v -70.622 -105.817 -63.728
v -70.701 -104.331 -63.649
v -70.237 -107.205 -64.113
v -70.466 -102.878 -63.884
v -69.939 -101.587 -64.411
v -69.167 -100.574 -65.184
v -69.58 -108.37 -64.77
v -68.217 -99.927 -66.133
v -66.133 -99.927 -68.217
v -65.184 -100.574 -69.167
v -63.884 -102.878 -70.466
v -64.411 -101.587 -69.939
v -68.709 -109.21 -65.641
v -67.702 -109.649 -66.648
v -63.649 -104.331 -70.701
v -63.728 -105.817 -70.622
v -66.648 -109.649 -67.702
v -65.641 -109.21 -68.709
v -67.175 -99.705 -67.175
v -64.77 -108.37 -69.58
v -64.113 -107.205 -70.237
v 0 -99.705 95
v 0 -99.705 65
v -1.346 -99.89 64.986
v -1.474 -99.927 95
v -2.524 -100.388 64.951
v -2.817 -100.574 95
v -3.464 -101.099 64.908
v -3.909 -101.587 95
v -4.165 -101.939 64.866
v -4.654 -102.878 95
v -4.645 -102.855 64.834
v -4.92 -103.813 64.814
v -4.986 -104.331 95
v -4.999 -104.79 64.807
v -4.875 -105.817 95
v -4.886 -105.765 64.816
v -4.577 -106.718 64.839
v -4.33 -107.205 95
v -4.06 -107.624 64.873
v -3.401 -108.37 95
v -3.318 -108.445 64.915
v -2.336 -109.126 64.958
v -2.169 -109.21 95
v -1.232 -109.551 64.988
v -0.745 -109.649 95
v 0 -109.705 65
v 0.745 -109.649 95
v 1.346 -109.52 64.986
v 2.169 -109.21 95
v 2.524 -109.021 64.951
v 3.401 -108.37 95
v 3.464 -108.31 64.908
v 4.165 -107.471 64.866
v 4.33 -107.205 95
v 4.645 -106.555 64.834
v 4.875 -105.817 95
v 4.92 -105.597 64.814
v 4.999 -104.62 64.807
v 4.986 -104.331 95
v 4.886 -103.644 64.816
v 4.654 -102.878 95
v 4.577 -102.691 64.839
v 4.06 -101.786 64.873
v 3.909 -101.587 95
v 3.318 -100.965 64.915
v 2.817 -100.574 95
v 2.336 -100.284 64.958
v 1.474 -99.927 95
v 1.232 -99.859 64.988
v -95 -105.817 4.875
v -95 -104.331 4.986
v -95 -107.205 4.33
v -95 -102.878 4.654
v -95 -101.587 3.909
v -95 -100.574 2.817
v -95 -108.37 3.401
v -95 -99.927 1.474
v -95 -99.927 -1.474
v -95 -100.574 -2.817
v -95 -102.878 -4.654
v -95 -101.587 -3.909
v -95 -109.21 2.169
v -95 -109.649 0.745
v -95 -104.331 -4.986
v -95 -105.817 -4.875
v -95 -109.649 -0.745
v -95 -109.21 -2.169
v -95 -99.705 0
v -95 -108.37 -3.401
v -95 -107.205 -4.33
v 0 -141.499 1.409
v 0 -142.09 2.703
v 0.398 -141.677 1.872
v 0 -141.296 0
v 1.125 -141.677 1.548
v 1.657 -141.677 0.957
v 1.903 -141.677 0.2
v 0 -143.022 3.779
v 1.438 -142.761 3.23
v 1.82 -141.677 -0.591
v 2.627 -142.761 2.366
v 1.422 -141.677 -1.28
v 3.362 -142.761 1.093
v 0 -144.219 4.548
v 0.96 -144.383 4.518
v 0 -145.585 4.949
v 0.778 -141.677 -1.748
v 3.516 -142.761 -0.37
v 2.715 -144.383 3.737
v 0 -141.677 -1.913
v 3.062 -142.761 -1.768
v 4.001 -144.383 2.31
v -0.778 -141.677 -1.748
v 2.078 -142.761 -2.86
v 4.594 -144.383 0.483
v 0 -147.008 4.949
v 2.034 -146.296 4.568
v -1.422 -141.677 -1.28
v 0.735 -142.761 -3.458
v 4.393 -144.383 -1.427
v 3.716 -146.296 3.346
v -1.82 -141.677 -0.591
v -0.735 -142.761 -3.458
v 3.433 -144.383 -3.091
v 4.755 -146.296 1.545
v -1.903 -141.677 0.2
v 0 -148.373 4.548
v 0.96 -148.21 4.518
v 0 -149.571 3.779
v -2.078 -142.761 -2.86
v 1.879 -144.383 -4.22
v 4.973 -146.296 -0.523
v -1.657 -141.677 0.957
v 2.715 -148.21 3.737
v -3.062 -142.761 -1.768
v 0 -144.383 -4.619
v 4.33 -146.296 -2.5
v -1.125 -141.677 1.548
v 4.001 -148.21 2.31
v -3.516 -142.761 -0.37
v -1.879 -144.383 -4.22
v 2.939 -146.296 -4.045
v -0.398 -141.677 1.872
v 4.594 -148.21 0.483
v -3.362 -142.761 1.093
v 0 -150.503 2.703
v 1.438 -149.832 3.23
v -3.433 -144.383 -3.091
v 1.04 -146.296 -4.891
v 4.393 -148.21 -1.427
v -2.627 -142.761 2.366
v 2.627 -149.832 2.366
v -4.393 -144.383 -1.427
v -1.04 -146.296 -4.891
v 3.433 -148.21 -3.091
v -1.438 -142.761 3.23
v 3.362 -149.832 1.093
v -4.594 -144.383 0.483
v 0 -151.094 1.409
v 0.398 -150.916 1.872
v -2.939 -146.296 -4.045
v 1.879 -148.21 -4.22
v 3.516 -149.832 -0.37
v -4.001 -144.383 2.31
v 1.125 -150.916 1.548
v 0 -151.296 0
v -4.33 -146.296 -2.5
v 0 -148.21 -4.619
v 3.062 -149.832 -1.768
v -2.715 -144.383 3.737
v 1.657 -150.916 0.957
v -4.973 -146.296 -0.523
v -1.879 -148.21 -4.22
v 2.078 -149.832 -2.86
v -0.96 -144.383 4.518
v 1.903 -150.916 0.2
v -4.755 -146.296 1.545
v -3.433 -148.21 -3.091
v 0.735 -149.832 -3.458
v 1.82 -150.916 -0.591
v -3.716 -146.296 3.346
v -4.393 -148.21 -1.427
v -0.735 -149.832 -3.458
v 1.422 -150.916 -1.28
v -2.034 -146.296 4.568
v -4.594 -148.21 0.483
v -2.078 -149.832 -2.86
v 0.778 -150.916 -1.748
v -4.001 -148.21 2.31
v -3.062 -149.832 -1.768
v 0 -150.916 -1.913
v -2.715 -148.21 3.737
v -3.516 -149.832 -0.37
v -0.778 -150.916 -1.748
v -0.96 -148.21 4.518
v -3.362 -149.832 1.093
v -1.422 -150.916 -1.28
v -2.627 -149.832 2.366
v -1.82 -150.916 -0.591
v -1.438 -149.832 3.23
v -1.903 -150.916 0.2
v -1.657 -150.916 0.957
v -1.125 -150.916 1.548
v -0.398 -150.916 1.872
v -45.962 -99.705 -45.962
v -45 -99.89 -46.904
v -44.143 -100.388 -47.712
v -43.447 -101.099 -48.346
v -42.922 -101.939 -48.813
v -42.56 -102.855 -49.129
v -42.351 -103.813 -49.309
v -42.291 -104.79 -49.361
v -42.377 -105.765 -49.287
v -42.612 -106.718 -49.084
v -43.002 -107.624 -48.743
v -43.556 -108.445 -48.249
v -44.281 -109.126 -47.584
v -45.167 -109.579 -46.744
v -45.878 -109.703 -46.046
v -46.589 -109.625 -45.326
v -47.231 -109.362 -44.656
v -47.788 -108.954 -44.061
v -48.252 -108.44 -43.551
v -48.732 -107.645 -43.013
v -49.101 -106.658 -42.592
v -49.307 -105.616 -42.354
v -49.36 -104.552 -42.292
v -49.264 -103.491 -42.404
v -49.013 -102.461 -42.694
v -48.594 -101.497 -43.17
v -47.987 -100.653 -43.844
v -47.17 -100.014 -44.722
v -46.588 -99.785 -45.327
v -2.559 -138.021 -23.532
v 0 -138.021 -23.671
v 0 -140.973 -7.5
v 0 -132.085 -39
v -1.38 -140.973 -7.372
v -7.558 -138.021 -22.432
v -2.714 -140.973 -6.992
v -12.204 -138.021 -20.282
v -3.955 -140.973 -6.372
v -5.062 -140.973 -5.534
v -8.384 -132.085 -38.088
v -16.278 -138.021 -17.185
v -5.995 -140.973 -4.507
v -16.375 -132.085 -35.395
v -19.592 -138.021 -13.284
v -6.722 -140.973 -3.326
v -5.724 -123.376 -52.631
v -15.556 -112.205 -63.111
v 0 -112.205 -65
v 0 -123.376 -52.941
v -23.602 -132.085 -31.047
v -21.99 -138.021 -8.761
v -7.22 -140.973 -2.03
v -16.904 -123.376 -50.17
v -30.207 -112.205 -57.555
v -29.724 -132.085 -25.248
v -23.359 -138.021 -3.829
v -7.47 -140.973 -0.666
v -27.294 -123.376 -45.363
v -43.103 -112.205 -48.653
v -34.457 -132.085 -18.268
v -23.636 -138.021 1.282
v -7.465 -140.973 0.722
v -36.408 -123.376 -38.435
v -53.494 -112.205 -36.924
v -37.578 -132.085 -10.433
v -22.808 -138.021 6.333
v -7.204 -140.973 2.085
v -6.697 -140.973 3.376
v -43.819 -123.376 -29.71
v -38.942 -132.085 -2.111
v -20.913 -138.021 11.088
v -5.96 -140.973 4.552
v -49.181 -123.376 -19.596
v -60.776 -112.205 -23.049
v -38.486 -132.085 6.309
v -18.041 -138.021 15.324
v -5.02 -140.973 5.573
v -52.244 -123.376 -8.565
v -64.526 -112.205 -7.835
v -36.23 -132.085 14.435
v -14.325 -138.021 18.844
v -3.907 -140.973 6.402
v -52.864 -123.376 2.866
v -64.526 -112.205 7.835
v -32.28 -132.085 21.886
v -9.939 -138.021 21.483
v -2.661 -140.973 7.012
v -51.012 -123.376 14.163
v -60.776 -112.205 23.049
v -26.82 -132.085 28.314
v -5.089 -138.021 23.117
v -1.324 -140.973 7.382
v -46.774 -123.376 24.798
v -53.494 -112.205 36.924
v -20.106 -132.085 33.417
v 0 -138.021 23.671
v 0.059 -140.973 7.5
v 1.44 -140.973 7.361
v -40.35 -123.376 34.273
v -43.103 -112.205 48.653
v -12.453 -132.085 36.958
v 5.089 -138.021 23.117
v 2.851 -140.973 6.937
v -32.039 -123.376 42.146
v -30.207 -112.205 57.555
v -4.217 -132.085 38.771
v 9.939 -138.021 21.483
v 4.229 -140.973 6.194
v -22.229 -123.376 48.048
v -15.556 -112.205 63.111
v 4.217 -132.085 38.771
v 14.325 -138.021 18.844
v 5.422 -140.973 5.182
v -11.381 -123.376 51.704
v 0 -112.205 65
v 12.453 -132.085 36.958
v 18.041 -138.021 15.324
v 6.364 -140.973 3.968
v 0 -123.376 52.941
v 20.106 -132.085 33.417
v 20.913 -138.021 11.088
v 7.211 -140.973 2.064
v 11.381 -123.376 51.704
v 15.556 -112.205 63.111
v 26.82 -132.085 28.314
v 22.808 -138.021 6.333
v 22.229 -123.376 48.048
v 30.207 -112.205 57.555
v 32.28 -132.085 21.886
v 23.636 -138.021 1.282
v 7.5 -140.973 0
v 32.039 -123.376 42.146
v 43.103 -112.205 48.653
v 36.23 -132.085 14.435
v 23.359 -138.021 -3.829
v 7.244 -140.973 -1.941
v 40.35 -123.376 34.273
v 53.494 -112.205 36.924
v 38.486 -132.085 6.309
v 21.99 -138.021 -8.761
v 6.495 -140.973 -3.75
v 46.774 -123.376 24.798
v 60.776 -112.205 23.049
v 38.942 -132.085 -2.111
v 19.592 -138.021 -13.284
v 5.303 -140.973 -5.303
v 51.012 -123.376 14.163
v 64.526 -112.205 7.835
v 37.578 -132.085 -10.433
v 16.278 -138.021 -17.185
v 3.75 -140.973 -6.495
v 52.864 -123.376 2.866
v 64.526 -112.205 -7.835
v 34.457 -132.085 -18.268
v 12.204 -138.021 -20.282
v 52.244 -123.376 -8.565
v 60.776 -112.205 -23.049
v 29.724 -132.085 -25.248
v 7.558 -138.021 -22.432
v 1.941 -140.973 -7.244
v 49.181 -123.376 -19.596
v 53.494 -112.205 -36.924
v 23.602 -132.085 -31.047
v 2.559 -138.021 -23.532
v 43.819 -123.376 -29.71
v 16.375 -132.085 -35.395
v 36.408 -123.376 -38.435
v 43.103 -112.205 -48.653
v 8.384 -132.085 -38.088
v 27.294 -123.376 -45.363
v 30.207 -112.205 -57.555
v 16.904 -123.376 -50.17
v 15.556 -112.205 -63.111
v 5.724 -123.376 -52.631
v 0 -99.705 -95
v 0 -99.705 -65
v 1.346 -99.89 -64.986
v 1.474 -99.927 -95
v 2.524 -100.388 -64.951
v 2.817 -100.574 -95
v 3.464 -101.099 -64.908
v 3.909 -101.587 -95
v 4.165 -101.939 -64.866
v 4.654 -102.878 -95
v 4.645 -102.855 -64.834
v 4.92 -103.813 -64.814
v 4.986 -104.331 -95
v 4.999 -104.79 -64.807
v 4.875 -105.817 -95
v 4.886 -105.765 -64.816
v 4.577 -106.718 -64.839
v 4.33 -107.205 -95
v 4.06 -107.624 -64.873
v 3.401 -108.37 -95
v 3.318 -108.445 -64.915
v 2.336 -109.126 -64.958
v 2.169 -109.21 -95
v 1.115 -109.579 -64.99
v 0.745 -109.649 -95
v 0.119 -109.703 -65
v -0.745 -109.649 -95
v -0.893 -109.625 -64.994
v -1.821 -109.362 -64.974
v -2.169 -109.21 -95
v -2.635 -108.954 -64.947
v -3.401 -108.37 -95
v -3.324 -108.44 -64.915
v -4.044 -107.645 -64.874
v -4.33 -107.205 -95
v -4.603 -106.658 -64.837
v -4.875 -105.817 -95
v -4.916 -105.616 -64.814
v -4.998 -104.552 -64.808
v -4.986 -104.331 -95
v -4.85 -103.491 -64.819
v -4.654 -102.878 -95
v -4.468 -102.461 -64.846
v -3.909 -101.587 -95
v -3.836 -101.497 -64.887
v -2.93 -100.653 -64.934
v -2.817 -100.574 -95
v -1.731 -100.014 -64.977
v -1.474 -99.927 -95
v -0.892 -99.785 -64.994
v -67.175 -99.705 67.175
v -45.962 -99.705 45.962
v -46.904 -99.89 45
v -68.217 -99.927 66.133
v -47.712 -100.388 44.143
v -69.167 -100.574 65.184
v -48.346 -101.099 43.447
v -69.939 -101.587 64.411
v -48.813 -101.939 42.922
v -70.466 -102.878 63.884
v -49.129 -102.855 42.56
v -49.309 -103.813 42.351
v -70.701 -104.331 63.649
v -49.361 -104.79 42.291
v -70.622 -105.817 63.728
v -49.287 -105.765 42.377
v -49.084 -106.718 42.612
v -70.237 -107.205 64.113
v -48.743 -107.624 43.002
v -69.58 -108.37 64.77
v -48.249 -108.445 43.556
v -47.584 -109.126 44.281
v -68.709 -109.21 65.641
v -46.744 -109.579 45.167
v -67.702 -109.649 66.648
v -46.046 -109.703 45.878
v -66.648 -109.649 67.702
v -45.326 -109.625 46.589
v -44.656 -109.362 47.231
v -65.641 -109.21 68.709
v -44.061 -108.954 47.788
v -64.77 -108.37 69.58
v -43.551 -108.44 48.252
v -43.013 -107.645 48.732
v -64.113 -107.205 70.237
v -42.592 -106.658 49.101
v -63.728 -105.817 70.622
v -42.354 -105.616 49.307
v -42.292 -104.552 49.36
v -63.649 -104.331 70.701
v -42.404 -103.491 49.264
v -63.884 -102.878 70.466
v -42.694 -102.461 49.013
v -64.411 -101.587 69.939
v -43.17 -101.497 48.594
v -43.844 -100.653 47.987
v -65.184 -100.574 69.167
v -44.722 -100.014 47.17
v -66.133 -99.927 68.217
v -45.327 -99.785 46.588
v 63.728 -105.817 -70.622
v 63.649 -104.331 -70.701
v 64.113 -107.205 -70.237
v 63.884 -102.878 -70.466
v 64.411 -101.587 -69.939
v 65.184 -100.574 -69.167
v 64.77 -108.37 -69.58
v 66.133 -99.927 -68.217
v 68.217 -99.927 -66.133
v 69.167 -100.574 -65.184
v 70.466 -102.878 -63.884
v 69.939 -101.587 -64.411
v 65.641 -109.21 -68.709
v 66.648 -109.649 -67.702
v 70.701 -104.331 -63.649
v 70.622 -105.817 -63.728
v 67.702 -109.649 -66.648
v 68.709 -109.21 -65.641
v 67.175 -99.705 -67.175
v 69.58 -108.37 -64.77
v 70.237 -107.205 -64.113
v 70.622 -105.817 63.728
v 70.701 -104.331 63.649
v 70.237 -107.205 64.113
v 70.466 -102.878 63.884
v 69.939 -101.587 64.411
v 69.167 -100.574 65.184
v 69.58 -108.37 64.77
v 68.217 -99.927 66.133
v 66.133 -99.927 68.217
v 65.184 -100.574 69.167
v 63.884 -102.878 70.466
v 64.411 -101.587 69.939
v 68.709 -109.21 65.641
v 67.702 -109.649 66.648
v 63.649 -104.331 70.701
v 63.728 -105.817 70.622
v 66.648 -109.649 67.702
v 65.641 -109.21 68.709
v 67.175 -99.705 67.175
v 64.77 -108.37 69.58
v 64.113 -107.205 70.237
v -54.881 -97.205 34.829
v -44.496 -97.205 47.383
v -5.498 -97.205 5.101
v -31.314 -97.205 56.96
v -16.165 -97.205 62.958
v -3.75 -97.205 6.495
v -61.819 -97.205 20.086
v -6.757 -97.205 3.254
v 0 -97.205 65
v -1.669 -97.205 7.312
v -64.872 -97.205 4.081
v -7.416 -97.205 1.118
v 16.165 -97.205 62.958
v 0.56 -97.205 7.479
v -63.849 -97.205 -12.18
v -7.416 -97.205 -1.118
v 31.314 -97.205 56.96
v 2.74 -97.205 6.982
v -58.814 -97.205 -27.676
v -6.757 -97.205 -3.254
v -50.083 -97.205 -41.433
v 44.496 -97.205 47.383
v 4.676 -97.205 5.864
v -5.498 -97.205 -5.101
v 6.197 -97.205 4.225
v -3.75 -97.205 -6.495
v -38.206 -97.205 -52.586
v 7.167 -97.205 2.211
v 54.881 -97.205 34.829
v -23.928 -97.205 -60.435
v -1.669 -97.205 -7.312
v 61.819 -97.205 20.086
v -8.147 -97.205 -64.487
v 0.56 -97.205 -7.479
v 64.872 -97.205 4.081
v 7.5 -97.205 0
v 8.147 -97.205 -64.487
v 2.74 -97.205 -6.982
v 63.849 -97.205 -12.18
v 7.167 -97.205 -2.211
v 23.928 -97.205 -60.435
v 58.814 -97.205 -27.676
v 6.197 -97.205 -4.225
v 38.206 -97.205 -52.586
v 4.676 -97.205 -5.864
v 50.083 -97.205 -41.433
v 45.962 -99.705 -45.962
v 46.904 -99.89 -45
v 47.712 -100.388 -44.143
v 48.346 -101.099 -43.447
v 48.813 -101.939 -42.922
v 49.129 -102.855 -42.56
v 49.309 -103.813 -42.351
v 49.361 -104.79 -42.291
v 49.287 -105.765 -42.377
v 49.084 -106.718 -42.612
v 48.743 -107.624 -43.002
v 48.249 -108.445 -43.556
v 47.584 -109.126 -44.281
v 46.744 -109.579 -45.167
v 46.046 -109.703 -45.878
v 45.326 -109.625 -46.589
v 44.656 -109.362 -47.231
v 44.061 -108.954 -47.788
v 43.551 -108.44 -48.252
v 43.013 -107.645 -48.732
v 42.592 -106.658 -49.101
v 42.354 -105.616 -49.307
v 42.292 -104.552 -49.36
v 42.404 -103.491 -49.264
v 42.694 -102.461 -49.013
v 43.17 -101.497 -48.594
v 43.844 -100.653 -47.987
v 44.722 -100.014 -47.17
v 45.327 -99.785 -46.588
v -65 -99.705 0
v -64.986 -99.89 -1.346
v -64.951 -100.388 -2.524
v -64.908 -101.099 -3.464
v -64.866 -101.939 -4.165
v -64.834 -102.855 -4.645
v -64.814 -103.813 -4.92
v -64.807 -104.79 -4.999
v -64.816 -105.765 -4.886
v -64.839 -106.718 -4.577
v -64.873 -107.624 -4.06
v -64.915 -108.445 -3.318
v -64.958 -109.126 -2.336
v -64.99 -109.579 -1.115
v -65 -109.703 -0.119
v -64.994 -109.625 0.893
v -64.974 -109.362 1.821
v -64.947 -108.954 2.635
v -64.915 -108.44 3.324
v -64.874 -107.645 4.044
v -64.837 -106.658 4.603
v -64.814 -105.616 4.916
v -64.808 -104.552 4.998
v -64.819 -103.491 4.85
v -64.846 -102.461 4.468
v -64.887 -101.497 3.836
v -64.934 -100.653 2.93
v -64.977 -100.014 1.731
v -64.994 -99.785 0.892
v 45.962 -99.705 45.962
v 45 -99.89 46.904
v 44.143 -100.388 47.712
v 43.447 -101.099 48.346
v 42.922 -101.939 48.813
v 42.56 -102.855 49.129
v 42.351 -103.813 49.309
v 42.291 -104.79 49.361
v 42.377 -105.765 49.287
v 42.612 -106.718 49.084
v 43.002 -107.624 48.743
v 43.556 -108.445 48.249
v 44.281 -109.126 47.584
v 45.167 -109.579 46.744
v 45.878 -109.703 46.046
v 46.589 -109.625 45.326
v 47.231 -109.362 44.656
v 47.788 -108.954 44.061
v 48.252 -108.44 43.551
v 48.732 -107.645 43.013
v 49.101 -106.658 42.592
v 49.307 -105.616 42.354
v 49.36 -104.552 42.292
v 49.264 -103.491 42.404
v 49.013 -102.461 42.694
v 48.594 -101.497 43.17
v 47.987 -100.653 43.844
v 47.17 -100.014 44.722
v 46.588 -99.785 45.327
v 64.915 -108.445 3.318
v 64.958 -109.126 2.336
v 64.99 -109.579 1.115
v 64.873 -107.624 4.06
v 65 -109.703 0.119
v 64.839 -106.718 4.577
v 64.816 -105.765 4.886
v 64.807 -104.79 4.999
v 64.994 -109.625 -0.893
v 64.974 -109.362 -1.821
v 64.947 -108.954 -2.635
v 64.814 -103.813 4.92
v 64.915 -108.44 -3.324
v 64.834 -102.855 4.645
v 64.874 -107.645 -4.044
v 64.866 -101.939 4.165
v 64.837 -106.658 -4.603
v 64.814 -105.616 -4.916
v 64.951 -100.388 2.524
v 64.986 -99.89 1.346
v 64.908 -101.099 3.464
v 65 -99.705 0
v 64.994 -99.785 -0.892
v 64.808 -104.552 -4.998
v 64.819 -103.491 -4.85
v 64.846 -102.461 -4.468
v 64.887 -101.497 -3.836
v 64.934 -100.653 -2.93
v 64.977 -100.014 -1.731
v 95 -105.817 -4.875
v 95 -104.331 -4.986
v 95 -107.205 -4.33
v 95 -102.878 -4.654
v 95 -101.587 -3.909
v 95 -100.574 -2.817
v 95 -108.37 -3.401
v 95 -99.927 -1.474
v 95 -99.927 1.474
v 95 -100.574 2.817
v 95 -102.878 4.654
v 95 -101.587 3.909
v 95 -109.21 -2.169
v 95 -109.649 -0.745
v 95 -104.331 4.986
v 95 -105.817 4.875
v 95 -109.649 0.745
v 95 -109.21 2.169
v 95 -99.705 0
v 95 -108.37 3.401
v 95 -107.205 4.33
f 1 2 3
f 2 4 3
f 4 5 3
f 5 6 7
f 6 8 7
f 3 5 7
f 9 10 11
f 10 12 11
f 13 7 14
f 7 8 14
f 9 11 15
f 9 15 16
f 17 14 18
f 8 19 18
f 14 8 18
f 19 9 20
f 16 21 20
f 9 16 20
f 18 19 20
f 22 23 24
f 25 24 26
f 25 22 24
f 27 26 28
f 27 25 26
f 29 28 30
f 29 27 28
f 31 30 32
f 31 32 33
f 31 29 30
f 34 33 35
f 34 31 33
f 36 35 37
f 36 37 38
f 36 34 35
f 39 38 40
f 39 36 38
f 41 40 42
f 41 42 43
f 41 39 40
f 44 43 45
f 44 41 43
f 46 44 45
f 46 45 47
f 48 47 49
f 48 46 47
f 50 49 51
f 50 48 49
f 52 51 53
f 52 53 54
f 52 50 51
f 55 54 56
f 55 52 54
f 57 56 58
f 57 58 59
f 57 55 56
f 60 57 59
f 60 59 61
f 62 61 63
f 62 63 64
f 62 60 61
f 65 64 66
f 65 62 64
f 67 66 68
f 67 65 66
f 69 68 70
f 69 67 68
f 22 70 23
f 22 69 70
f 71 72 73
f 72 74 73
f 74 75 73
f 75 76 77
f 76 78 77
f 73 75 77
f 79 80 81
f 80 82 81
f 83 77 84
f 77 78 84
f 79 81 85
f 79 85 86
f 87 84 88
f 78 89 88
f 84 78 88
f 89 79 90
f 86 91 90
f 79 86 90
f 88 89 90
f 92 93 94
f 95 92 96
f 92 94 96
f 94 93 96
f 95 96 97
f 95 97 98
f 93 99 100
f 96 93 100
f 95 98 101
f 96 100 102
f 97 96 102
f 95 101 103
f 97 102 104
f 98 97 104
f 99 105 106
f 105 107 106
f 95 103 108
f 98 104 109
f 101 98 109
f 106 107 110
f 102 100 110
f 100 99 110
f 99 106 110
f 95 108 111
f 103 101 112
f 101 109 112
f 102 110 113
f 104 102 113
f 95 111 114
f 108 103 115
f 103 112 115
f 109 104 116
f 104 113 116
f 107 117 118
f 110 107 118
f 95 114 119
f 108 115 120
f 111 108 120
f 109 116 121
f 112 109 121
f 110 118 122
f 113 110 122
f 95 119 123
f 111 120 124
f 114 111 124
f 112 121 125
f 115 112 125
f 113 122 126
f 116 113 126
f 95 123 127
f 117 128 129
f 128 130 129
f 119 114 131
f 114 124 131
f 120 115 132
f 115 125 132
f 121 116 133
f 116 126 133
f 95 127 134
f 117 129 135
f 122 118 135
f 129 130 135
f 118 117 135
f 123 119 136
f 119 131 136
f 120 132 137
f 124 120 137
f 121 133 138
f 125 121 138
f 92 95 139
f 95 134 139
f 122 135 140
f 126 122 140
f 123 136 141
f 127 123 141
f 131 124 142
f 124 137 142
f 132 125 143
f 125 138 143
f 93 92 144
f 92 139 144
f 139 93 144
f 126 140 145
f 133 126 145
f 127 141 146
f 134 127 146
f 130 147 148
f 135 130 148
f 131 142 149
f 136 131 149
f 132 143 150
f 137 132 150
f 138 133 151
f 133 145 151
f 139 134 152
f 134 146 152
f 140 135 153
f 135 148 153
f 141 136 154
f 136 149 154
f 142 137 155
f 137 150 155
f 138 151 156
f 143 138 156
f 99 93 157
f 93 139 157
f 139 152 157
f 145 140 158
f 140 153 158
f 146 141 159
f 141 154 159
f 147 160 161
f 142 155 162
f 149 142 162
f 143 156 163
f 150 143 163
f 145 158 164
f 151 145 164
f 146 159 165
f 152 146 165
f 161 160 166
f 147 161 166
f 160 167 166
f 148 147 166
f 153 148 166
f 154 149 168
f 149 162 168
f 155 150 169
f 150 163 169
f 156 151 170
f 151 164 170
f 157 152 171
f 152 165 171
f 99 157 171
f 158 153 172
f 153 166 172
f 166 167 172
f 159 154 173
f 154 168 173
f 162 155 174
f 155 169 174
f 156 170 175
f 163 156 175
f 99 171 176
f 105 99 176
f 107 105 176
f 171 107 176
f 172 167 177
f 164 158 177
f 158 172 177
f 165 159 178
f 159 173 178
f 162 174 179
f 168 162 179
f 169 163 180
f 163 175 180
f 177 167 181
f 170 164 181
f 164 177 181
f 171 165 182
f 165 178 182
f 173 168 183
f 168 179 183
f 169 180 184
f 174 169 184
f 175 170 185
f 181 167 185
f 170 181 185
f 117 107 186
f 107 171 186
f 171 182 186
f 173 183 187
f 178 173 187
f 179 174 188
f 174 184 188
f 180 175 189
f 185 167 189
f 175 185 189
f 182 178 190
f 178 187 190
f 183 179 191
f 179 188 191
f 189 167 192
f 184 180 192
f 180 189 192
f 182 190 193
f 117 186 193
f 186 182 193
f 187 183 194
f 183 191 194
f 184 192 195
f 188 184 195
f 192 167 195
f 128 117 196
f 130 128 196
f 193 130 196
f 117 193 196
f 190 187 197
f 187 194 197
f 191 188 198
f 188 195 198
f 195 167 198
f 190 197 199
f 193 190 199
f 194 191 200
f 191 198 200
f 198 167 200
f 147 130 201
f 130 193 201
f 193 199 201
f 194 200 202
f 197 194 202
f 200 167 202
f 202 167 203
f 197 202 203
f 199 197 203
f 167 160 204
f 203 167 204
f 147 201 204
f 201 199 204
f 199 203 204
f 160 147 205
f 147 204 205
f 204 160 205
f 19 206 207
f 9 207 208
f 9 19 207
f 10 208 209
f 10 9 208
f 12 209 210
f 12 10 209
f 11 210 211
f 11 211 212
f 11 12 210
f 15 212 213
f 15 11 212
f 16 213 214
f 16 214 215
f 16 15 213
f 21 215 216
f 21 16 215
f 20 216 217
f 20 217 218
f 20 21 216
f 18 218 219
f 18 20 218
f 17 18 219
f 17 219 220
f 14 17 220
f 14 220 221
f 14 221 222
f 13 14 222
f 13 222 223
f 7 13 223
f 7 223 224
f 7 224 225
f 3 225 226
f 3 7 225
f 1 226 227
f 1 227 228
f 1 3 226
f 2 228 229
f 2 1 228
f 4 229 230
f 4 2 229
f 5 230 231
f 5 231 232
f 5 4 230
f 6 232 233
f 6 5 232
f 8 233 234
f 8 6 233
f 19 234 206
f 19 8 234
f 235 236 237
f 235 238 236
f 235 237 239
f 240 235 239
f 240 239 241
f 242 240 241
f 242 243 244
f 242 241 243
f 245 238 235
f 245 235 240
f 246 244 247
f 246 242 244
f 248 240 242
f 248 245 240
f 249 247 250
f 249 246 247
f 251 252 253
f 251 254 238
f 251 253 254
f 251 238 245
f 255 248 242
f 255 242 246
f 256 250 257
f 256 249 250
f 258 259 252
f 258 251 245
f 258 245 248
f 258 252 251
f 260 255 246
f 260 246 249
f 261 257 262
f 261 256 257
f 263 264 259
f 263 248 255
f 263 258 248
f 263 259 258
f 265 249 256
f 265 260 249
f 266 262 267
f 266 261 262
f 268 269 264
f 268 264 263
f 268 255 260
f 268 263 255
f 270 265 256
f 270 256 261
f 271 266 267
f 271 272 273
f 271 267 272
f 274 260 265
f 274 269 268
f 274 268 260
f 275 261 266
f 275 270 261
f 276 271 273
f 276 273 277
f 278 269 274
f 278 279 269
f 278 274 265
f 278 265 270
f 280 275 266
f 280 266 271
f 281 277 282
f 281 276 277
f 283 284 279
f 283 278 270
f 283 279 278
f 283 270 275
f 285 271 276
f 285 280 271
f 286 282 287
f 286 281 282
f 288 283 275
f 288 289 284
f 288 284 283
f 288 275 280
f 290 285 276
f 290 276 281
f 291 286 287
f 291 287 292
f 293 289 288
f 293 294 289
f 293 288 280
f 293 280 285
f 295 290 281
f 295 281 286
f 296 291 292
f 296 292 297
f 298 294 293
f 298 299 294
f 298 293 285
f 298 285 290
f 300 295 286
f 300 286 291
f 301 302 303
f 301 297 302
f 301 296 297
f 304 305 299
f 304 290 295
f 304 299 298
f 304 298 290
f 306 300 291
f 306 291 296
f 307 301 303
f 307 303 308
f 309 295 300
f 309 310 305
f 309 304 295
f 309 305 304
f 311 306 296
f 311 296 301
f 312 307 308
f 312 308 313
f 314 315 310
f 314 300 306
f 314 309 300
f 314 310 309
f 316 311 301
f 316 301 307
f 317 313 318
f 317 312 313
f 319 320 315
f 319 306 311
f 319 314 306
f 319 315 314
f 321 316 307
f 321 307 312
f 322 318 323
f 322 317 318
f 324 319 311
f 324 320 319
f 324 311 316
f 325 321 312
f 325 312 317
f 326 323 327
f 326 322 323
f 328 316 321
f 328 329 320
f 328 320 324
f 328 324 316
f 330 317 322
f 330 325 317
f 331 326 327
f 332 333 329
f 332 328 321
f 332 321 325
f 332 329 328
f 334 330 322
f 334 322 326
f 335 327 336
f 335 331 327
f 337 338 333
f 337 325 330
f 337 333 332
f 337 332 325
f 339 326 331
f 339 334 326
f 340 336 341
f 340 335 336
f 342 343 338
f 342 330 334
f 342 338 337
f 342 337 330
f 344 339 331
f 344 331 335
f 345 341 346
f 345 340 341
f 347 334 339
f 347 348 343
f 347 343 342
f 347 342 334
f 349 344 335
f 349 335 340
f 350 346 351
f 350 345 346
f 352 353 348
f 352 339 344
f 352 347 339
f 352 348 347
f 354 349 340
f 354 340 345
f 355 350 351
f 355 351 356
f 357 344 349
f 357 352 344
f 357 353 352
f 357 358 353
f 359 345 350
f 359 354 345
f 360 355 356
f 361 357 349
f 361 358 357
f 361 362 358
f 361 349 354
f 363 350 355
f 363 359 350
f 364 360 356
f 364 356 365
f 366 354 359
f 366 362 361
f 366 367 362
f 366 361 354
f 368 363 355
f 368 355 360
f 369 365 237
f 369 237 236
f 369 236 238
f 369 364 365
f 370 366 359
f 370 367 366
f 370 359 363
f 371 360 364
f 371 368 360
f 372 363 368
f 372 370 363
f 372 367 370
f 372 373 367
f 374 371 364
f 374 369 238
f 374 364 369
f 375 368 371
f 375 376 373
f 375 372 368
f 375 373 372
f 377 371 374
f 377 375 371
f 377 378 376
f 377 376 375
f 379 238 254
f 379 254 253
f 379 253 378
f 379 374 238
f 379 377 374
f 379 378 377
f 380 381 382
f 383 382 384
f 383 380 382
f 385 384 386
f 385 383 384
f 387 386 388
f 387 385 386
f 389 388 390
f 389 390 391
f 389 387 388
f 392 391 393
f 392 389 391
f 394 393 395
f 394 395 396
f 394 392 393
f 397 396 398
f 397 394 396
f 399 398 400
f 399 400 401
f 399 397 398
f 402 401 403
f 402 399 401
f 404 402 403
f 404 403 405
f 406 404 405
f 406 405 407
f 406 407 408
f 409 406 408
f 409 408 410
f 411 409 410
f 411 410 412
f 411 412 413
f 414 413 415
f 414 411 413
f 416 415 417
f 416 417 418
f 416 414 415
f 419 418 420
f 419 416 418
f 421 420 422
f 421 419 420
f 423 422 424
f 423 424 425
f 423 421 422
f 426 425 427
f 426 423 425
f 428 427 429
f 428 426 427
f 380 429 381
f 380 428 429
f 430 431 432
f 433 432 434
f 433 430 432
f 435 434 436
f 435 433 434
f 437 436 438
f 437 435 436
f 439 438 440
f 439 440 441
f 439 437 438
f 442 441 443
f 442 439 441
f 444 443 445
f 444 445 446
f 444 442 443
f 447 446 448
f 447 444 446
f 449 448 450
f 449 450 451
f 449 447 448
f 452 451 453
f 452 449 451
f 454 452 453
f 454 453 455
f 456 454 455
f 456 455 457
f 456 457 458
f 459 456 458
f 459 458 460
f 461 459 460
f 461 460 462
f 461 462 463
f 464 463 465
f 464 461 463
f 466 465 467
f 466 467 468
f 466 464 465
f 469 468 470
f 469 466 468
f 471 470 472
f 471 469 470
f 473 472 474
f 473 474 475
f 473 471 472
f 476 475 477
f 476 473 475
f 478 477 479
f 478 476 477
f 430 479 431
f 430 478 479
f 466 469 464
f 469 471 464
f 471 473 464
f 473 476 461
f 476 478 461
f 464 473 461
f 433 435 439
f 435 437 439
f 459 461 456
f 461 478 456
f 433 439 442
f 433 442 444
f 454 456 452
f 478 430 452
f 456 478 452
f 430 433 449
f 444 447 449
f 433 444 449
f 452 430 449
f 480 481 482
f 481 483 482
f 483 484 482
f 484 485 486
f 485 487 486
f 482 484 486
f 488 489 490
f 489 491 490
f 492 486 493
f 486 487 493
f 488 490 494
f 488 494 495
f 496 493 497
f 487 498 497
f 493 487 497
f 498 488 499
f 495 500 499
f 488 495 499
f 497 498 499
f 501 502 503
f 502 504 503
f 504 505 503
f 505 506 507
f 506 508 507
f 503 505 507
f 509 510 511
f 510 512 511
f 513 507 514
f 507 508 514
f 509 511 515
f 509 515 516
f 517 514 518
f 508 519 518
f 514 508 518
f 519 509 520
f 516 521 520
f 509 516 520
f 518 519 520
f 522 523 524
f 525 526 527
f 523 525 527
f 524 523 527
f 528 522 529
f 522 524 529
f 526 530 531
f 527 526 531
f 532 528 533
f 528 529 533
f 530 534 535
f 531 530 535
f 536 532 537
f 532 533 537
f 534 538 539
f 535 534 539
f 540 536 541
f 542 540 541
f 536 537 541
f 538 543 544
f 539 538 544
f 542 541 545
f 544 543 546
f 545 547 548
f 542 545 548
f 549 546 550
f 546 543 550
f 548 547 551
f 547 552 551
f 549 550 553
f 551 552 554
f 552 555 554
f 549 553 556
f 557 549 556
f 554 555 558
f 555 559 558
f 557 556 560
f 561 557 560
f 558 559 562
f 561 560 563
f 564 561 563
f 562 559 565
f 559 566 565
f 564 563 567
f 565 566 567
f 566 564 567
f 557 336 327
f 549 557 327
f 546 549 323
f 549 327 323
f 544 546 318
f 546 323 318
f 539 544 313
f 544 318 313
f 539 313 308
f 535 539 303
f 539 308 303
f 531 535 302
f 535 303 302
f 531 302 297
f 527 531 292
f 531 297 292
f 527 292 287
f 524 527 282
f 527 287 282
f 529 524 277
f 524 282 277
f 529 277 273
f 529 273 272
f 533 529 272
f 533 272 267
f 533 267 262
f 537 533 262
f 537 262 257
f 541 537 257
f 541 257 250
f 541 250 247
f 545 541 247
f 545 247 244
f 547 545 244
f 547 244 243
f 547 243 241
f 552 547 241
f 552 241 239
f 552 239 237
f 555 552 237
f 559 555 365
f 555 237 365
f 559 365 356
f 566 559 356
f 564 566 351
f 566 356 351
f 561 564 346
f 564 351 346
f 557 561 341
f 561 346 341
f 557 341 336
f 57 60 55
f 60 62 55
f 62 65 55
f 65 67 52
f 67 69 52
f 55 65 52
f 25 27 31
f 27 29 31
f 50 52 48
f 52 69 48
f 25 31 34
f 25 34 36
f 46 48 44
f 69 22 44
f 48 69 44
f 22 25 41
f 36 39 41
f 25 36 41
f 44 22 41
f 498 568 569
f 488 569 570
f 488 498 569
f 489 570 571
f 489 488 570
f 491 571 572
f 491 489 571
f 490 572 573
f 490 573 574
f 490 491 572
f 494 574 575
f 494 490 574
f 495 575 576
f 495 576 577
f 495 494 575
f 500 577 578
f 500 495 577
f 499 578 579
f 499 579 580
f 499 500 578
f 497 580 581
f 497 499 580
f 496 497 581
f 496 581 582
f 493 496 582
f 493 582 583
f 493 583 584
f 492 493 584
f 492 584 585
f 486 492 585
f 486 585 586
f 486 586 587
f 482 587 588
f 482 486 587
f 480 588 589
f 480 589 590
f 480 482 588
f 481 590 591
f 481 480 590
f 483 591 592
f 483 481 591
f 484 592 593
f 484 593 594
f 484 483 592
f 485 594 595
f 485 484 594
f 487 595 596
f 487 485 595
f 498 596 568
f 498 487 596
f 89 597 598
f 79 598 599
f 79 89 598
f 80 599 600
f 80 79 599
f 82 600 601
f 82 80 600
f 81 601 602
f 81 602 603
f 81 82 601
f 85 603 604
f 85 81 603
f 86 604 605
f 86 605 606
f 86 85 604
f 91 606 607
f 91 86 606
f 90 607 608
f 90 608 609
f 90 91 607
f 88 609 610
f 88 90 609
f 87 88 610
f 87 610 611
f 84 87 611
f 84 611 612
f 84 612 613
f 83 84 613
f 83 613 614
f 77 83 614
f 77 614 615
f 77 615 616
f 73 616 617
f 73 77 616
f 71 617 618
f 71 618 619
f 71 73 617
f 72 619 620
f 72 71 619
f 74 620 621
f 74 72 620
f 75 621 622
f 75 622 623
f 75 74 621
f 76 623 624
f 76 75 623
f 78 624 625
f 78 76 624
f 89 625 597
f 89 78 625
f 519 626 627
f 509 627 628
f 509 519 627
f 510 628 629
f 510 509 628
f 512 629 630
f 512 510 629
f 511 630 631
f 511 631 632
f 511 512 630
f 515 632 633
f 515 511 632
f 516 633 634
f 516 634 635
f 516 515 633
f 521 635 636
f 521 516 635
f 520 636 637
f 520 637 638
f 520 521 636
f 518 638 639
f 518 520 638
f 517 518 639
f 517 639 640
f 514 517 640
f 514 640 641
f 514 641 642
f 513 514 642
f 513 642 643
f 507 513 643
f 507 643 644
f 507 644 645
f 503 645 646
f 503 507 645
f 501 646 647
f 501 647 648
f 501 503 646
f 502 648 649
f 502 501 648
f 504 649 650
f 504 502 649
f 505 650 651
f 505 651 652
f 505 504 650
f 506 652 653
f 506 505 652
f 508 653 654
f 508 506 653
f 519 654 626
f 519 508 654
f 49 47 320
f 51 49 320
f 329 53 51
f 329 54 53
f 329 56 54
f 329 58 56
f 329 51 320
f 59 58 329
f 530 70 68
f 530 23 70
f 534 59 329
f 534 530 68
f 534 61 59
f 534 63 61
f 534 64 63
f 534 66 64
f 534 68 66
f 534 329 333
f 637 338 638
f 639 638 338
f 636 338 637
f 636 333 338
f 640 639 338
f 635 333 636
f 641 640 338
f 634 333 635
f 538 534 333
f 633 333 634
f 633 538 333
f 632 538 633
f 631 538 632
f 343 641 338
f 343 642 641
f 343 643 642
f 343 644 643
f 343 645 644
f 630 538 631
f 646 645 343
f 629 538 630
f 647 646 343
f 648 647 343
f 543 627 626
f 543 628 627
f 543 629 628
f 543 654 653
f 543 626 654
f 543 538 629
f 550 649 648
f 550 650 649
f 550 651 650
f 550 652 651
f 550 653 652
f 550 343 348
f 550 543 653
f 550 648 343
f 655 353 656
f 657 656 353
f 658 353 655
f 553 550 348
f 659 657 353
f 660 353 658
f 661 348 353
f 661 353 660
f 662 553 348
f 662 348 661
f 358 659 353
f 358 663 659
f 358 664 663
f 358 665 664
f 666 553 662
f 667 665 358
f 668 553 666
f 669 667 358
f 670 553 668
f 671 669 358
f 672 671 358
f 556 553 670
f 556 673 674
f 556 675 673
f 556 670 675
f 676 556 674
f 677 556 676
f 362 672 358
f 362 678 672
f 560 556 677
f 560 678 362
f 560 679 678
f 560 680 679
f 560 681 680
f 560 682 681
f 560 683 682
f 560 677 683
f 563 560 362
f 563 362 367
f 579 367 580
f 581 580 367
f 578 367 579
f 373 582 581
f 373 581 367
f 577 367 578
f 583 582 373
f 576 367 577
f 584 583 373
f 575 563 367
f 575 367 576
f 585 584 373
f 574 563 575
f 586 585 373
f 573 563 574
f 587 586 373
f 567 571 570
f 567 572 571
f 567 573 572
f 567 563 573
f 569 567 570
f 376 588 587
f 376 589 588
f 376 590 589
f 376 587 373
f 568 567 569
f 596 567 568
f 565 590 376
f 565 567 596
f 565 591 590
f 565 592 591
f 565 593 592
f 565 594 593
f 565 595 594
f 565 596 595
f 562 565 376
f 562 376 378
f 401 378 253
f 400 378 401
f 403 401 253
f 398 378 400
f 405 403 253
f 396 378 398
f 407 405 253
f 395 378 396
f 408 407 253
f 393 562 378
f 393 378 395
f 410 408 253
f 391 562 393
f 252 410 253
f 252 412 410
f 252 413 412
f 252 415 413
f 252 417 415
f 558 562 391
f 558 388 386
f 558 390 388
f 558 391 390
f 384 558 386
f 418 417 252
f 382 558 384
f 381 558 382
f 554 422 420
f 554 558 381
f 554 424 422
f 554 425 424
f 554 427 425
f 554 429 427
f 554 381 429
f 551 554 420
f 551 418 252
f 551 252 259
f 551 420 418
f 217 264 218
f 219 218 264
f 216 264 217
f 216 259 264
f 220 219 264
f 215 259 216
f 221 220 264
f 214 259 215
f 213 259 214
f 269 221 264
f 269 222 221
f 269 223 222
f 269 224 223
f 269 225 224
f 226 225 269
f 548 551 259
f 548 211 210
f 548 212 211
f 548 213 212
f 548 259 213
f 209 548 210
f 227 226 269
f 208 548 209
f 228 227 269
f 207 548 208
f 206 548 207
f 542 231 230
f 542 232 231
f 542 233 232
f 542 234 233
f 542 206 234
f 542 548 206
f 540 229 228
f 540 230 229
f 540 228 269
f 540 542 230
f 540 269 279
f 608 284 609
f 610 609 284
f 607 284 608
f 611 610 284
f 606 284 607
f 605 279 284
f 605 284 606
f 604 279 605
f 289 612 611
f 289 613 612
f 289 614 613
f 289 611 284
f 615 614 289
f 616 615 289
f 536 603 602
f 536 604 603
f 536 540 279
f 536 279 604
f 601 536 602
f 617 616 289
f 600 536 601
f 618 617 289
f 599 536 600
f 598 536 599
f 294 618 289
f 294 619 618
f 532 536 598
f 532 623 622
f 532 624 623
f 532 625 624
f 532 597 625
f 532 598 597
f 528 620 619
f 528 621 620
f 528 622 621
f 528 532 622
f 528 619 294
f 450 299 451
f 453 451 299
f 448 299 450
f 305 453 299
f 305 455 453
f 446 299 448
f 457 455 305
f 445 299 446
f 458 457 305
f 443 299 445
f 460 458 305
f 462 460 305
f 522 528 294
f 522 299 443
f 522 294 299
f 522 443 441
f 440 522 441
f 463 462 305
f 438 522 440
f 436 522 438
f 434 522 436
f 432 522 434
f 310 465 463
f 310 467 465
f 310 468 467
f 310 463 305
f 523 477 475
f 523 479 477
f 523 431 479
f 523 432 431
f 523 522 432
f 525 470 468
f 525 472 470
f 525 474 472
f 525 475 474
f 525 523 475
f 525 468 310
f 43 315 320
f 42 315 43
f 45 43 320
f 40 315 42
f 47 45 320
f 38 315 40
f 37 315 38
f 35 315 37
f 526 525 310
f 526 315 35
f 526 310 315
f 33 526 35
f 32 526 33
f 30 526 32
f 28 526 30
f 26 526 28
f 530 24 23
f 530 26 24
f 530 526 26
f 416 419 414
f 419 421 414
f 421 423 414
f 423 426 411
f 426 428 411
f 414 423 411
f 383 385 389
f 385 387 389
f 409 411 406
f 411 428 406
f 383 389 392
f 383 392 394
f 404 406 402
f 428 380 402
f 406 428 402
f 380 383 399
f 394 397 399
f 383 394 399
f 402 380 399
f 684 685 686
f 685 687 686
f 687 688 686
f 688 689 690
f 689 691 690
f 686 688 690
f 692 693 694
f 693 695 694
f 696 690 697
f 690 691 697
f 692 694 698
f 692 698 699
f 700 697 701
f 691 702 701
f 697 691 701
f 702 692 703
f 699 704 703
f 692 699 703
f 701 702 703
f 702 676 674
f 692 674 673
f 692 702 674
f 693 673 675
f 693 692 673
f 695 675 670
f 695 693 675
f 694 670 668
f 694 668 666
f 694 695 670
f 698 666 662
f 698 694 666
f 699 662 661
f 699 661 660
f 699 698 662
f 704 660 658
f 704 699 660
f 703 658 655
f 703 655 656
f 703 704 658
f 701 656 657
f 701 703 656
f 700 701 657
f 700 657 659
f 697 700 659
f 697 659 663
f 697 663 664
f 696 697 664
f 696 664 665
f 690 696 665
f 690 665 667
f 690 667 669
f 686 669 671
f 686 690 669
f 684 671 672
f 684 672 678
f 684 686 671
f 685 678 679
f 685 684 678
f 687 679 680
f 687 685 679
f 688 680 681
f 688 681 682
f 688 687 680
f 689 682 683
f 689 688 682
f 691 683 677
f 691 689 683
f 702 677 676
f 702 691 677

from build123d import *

# Parameters (mm, degrees)
F0_W     = 15
F0_H     = 65
F6_W     = 5
F6_H     = 30
F6_H_2   = 1.7657750845
F8_COUNT = 8
F10_D    = 15


with BuildPart() as f1:
    # F0 (on Right) → F1 (revolve)
    with BuildSketch(Plane.YZ):
        with Locations((-104.7048869729, 32.5)):
            Rectangle(F0_W, F0_H)
    revolve(axis=Axis((0, -59.3888796866, 0), (0, 1, 0)))

    # F2 (on Right) → F3 (revolve)
    with BuildSketch(Plane.YZ):
        with BuildLine():
            ThreePointArc((-141.2963948166, 0), (-133.6917758296, -35.6065858677), (-112.2048869729, -65))
            Line((-112.2048869729, -65), (-112.2048869729, 0))
            Line((-112.2048869729, 0), (-141.2963948166, 0))
        make_face()
    revolve(axis=Axis((0, -59.3888796866, 0), (0, 1, 0)))

    # F6 (on Right) → F7 (revolve)
    with BuildSketch(Plane.YZ):
        with Locations((-102.2048869729, 80)):
            Rectangle(F6_W, F6_H)
        with Locations((-102.2048869729, 64.1171124578)):
            Rectangle(F6_W, F6_H_2)
    revolve(axis=Axis((0, -104.7048869729, 87.7374348044), (0, 0, 1)))

    # F8: F1 ×8 about axis
    f8_axis = Axis((0, -59.3888796866, 0), (0, 1, 0))


with BuildPart() as f5:
    # F4 (on Right) → F5 (revolve)
    with BuildSketch(Plane.YZ):
        with BuildLine():
            Line((-151.2963948166, 0), (-141.2963948166, 0))
            ThreePointArc((-141.2963948166, 0), (-146.2963948166, 5), (-151.2963948166, 0))
        make_face()
    revolve(axis=Axis((0, -59.3888796866, 0), (0, 1, 0)))


with BuildPart() as f1_1:
    add(f1.part)
    for i in range(1, F8_COUNT):
        add(f1.part.rotate(f8_axis, i * 360 / F8_COUNT))

    # F10 (through all)
    with Locations(Plane(origin=(0, -97.2048869729, 0), x_dir=(-1, 0, 0), z_dir=(0, 1, 0))):
        with Locations((0, 0)):
            Hole(F10_D / 2)


solid = Compound([f5.part, f1_1.part])
